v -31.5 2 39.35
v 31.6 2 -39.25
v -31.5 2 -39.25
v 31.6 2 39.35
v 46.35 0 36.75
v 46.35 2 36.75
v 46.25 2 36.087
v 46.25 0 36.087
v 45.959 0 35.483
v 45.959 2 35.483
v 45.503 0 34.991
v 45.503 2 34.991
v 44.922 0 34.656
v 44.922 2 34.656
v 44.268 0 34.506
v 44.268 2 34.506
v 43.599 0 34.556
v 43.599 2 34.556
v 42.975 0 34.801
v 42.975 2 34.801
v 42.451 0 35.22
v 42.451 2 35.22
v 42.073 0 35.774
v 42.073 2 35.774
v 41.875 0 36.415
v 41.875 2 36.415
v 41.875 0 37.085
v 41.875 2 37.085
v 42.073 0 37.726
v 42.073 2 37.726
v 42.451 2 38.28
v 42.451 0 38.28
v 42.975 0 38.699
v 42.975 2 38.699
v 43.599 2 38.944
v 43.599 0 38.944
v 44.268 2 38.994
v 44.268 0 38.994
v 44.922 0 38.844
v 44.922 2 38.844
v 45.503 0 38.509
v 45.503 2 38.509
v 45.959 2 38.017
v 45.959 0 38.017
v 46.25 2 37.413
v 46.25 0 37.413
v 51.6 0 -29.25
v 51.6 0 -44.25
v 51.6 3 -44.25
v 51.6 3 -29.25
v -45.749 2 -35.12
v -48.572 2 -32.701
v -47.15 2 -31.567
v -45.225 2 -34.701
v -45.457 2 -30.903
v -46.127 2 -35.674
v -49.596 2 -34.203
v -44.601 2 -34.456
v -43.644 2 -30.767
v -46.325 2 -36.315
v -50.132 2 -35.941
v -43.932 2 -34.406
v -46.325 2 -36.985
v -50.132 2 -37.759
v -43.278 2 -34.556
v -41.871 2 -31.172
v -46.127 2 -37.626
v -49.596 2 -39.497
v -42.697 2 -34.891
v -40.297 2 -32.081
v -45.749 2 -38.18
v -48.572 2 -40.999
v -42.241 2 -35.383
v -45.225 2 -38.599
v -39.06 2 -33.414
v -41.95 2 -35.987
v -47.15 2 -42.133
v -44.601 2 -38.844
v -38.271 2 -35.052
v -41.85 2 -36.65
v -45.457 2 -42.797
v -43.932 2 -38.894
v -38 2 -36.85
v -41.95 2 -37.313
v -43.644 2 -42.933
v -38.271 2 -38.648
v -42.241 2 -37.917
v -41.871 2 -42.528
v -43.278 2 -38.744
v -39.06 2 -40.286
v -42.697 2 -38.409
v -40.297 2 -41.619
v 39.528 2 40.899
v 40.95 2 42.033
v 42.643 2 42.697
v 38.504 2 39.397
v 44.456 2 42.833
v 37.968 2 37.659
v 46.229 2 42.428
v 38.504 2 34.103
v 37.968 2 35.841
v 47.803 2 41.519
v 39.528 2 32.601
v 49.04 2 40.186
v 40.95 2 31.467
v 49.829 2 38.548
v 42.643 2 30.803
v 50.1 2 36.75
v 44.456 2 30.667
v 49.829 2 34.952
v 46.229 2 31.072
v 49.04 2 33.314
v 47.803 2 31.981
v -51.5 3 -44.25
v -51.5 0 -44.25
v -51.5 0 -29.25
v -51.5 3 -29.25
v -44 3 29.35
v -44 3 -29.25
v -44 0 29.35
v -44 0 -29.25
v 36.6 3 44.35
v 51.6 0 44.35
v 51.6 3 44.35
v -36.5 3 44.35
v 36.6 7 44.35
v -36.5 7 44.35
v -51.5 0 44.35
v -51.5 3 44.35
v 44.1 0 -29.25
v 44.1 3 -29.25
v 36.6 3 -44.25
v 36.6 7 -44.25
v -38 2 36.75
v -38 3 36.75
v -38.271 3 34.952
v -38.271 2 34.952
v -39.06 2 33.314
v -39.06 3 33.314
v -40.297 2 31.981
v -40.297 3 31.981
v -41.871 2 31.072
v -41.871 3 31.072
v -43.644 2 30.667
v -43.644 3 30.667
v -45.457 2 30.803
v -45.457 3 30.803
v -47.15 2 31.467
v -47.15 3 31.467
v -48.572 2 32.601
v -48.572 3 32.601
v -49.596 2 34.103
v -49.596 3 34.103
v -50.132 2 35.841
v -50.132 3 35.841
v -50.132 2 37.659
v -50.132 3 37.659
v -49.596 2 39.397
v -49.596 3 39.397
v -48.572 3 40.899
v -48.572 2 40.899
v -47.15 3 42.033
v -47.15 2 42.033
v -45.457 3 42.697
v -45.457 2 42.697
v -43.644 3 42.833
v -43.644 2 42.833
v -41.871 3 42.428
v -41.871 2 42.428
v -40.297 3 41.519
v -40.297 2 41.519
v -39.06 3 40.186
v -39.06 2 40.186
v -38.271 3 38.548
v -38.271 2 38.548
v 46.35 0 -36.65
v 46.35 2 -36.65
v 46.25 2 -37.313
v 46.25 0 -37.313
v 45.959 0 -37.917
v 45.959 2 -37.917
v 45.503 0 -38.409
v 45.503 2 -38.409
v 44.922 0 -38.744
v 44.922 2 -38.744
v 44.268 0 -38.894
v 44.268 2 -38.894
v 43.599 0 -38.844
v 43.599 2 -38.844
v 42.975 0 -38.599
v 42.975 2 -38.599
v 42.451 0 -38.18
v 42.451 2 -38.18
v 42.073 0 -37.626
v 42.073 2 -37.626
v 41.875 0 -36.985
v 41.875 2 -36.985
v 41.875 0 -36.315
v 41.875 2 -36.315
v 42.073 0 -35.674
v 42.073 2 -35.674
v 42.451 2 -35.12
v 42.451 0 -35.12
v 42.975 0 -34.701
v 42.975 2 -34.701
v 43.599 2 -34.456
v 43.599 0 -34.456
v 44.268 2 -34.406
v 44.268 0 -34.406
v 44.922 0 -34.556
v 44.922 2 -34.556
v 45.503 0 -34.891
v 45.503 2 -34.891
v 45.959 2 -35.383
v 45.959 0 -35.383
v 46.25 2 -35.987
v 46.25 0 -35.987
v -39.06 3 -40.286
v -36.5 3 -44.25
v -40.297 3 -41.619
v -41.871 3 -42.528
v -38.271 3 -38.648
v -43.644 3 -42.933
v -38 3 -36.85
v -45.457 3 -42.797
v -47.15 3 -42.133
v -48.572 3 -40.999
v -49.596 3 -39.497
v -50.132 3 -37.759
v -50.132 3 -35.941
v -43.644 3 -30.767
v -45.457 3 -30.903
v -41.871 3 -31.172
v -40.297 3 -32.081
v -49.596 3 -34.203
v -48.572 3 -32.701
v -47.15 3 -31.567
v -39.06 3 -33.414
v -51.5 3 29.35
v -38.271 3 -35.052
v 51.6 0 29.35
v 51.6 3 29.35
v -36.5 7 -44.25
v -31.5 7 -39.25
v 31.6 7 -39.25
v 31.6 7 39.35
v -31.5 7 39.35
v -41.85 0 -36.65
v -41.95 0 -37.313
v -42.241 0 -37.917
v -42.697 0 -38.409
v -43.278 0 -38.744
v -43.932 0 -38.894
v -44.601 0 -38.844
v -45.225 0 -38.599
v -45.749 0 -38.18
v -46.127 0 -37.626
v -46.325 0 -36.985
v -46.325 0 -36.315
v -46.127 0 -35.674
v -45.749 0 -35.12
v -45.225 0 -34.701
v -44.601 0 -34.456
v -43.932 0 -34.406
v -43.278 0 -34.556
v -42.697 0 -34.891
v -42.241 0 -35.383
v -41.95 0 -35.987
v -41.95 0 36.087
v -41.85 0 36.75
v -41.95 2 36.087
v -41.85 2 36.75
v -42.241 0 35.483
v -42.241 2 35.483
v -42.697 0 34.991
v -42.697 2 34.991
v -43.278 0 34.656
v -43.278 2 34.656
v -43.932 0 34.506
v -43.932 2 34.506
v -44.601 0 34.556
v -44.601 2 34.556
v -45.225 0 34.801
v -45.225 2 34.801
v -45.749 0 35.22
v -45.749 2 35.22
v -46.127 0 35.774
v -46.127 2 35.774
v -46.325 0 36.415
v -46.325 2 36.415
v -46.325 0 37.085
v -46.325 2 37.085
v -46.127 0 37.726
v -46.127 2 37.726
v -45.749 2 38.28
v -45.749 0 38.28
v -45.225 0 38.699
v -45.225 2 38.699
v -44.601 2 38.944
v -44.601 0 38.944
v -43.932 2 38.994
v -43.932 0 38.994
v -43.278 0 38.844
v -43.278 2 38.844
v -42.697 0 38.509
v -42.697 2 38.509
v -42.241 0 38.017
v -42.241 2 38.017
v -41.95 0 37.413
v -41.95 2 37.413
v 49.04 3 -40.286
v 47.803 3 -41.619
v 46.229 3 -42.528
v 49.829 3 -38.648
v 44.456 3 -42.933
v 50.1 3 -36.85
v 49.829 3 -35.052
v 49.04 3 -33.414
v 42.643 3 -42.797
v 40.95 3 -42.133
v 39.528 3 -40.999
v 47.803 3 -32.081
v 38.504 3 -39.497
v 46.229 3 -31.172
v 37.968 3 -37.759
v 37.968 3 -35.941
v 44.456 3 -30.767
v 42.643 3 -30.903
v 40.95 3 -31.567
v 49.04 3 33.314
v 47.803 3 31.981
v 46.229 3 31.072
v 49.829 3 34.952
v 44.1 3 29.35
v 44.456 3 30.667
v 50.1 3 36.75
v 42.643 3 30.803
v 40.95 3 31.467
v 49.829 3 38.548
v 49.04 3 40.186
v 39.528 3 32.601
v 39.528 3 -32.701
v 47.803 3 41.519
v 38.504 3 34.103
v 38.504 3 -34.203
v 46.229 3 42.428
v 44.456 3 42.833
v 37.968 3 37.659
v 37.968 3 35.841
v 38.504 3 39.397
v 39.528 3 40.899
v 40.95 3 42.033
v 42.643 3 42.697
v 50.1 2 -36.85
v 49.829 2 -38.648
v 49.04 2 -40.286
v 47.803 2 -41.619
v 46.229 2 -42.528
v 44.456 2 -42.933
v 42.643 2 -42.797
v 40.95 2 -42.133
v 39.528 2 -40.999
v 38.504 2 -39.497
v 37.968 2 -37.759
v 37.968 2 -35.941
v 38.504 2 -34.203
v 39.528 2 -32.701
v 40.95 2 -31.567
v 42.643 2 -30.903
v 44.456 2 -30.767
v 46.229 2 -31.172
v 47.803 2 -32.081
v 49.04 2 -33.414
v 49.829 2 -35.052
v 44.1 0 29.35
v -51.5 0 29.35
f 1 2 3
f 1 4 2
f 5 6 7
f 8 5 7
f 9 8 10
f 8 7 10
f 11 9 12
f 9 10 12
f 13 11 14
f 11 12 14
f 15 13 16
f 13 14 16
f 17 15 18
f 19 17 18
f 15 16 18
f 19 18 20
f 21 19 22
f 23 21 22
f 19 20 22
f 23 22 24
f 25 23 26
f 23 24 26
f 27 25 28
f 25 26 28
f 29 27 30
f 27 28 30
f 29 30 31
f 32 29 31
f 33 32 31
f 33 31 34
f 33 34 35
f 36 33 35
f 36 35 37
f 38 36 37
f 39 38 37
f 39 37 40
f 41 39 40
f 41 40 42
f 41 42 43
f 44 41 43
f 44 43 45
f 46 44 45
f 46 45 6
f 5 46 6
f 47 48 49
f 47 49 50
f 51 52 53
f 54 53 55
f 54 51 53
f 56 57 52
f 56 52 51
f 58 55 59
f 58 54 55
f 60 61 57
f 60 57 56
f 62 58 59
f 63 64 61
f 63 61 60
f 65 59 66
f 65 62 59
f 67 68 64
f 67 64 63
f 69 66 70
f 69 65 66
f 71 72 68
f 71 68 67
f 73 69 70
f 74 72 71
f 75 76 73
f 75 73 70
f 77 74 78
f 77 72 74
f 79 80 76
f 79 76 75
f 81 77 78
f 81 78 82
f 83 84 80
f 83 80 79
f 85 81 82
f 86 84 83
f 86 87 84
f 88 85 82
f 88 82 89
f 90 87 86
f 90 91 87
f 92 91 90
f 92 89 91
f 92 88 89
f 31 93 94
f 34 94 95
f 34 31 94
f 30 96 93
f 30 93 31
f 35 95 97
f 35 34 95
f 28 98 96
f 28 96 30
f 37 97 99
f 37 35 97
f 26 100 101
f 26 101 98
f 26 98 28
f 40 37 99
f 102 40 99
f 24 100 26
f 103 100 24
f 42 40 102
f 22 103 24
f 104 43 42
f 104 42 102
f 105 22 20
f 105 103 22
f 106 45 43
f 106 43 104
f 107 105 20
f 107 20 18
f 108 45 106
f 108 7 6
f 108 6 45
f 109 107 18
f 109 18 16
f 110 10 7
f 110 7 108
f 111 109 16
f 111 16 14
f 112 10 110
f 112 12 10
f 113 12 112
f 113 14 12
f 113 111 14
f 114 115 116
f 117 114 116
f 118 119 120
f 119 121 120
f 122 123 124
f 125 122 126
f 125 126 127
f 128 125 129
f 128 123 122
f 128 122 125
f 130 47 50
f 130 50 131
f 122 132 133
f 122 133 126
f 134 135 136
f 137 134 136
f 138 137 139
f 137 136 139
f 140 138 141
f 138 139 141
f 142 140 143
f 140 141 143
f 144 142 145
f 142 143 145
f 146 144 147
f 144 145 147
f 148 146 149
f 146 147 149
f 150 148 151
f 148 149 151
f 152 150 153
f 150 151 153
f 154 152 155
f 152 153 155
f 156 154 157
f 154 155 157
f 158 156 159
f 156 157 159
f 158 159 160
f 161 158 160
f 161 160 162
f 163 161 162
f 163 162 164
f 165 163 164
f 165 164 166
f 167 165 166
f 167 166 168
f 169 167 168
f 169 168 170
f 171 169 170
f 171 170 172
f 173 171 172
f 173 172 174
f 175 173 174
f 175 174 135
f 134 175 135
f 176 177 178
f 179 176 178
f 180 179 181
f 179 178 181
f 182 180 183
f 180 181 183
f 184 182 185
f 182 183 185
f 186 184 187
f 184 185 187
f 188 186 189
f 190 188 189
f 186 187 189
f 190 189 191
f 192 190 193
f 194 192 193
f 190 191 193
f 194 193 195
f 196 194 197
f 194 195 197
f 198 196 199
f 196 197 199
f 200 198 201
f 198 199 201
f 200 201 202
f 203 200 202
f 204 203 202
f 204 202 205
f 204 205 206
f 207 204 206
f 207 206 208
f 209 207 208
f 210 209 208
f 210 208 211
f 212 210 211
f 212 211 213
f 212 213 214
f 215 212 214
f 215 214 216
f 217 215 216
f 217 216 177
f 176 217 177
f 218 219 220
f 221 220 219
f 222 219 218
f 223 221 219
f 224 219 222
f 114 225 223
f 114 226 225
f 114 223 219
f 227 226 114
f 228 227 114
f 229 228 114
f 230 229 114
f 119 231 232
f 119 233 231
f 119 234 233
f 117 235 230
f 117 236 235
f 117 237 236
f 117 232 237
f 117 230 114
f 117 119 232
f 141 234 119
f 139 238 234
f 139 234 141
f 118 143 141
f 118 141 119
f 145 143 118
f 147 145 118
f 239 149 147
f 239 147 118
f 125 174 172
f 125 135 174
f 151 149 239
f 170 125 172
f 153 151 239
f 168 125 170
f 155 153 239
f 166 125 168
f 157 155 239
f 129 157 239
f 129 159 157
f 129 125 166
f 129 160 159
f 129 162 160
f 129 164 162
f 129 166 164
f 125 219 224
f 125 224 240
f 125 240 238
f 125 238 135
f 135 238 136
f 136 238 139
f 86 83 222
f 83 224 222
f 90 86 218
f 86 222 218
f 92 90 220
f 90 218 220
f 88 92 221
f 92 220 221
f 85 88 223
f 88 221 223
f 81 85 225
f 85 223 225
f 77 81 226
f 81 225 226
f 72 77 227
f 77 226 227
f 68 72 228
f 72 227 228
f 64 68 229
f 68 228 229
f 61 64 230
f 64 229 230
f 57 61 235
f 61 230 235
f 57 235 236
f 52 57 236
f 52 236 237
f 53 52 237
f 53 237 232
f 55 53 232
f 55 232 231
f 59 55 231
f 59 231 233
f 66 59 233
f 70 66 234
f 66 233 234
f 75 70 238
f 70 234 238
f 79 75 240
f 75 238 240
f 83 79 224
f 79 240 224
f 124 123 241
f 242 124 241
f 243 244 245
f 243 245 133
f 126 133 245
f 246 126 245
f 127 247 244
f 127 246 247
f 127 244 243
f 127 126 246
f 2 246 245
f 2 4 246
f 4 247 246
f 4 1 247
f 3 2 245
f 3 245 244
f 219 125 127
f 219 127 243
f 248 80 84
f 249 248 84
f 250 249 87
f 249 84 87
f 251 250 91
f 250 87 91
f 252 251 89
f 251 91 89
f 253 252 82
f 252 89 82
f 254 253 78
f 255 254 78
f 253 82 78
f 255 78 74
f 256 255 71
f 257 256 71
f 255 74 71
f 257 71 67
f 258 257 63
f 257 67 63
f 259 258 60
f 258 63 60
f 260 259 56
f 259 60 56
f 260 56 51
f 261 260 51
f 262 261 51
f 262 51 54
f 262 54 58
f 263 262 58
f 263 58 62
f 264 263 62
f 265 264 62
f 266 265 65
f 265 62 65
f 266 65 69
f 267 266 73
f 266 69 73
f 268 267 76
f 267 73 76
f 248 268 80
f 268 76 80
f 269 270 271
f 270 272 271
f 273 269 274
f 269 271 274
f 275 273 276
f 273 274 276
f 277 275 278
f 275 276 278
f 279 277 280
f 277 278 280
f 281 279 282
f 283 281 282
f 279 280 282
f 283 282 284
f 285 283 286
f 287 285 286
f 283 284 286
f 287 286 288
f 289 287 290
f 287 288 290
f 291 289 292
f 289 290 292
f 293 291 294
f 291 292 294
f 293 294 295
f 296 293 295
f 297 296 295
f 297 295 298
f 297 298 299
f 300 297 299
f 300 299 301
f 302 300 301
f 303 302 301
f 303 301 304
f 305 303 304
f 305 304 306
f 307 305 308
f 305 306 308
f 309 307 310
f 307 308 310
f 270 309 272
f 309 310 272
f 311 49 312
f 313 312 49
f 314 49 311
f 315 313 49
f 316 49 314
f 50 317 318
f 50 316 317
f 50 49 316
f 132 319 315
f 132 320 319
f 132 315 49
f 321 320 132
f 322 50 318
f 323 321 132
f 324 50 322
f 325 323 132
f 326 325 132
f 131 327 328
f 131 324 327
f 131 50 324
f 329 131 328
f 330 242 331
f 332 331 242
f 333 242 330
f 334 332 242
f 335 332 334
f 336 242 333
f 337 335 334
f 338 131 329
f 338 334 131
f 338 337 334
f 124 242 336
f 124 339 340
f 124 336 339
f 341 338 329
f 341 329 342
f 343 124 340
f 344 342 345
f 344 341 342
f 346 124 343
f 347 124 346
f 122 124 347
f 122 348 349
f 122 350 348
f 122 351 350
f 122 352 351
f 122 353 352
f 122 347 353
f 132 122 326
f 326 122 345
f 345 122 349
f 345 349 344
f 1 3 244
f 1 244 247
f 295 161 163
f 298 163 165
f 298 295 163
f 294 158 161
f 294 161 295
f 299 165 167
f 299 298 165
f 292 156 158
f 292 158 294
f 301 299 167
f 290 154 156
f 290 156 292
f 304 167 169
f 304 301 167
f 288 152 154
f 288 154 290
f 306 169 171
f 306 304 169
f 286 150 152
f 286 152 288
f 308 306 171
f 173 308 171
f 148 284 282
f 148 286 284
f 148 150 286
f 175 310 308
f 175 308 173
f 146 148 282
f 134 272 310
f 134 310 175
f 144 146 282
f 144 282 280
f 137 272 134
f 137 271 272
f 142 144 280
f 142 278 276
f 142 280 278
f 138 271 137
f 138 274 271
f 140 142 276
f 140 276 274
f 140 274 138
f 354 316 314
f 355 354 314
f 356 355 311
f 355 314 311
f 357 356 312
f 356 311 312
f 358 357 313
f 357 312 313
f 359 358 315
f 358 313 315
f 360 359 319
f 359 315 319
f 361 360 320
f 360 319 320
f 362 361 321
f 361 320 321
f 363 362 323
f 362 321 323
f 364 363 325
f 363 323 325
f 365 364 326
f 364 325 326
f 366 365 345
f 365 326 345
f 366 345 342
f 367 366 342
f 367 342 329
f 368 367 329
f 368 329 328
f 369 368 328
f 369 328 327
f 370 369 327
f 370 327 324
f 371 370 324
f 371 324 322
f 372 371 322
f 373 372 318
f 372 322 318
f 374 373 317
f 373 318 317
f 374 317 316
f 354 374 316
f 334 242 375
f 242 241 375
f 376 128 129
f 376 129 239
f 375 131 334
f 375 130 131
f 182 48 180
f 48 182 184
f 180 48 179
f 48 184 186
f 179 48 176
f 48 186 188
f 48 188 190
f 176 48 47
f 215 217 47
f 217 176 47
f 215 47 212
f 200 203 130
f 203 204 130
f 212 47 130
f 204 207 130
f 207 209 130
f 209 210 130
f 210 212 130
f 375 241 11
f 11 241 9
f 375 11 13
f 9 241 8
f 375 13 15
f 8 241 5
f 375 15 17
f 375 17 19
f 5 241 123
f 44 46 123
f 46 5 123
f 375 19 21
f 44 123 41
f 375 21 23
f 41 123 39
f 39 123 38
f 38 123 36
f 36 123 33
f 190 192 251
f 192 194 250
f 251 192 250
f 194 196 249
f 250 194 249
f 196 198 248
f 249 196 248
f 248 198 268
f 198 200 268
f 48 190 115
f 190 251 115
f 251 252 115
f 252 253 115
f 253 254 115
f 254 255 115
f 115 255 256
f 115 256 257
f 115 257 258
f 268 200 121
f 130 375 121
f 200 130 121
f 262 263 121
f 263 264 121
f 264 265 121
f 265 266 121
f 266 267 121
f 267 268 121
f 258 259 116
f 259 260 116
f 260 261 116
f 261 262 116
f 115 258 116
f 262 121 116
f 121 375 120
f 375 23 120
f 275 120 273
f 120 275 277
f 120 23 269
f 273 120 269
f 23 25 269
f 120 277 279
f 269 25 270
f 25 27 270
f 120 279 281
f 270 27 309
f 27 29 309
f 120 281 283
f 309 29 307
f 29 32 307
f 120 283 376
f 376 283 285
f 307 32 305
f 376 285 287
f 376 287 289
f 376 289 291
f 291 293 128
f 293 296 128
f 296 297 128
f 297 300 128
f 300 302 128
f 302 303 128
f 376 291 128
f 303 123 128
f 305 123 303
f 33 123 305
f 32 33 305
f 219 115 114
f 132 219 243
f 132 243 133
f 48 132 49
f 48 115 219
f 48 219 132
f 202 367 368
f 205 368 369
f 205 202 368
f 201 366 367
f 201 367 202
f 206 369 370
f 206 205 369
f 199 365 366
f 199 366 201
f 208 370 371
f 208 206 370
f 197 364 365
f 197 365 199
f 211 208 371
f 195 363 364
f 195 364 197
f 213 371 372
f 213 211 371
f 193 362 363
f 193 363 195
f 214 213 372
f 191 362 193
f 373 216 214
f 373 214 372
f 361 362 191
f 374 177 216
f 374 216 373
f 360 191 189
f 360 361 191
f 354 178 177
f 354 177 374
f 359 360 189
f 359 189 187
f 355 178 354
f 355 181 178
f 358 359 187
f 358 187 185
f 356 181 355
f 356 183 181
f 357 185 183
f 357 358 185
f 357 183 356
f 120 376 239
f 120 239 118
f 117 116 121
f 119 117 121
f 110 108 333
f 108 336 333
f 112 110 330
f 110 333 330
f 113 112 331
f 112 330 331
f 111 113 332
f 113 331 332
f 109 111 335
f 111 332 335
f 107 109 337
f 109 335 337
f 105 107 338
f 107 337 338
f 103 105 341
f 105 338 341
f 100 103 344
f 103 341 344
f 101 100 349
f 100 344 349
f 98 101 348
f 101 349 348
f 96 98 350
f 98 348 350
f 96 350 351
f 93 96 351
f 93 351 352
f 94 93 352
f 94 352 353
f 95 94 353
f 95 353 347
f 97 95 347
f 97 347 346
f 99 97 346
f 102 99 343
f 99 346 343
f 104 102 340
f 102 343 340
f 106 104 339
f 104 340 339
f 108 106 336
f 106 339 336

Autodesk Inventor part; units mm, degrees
ref_plane "YZ Plane" through (0, 0, 0) normal (1, 0, 0) x (0, 1, 0)
ref_plane "XZ Plane" through (0, 0, 0) normal (0, 1, 0) x (-1, 0, 0)
ref_plane "XY Plane" through (0, 0, 0) normal (0, 0, 1) x (1, 0, 0)
sketch "Boceto1" plane through (0, 0, 0) normal (0, 1, 0) x (-1, 0, 0)
  line L0 (-31.6, 39.35) -> (-31.6, -39.25)
  line L1 (-31.6, -39.25) -> (31.5, -39.25)
  line L2 (31.5, -39.25) -> (31.5, 39.35)
  line L3 (31.5, 39.35) -> (-31.6, 39.35)
  line L4 (-31.6, 39.35) -> (31.5, -39.25) construction
  line L5 (-31.6, -39.25) -> (31.5, 39.35) construction
  line L6 (36.5, 44.35) -> (36.5, -44.25)
  line L7 (36.5, -44.25) -> (-36.6, -44.25)
  line L8 (-36.6, -44.25) -> (-36.6, 44.35)
  line L9 (-36.6, 44.35) -> (36.5, 44.35)
  point P0 (0, 0)
  point P1 (-0.05, 0.05)
  dimension "d0" = 78.6
  dimension "d1" = 63.1
  dimension "d2" = 5
extrude "Extrusión1" add sketch "Boceto1" along normal blind 2 contours L3 L2 L1 L0
sketch "Boceto2" plane through (0, 0, 0) normal (0, 1, 0) x (-1, 0, 0)
  line L0 (-31.6, 39.35) -> (-31.6, -39.25)
  line L1 (-31.6, -39.25) -> (31.5, -39.25)
  line L2 (31.5, -39.25) -> (31.5, 39.35)
  line L3 (31.5, 39.35) -> (-31.6, 39.35)
  line L4 (-31.6, 39.35) -> (31.5, -39.25) construction
  line L5 (-31.6, -39.25) -> (31.5, 39.35) construction
  line L6 (36.5, 44.35) -> (36.5, -44.25)
  line L7 (36.5, -44.25) -> (-36.6, -44.25)
  line L8 (-36.6, -44.25) -> (-36.6, 44.35)
  line L9 (-36.6, 44.35) -> (36.5, 44.35)
  point P0 (0, 0)
  point P1 (0, 0)
  point P2 (-0.05, 0.05)
  dimension "d5" = 78.6
  dimension "d6" = 63.1
  dimension "d7" = 5
extrude "Extrusión2" add sketch "Boceto2" along normal blind 7
sketch "Boceto3" plane through (0, 0, 0) normal (0, 1, 0) x (-1, 0, 0)
  circle A0 centre (44, 36.85) radius 6.1
  line L0 (36.5, 44.35) -> (-36.6, 44.35) projected
  line L1 (36.5, 44.35) -> (51.5, 44.35)
  line L2 (51.5, 44.35) -> (51.5, 29.35)
  line L3 (51.5, 29.35) -> (36.5, 29.35)
  line L4 (36.5, 29.35) -> (36.5, 44.35)
  line L5 (36.5, -44.25) -> (36.5, 44.35) projected
  line L6 (36.5, 0.05) -> (47.8738, 0.05)
  line L7 (-0.05, 44.35) -> (-0.05, 26.6285)
  circle A1 centre (44, -36.75) radius 6.1
  line L8 (36.5, -44.25) -> (51.5, -44.25)
  line L9 (51.5, -44.25) -> (51.5, -29.25)
  line L10 (51.5, -29.25) -> (36.5, -29.25)
  line L11 (36.5, -29.25) -> (36.5, -44.25)
  circle A2 centre (-44.1, 36.85) radius 6.1
  line L12 (-36.6, 44.35) -> (-51.6, 44.35)
  line L13 (-51.6, 44.35) -> (-51.6, 29.35)
  line L14 (-51.6, 29.35) -> (-36.6, 29.35)
  line L15 (-36.6, 29.35) -> (-36.6, 44.35)
  circle A3 centre (-44.1, -36.75) radius 6.1
  line L16 (-36.6, -44.25) -> (-51.6, -44.25)
  line L17 (-51.6, -44.25) -> (-51.6, -29.25)
  line L18 (-51.6, -29.25) -> (-36.6, -29.25)
  line L19 (-36.6, -29.25) -> (-36.6, -44.25)
  line L20 (44, 29.35) -> (36.5, 29.35)
  line L21 (36.5, 29.35) -> (36.5, -29.25)
  line L22 (36.5, -29.25) -> (44, -29.25)
  line L23 (44, -29.25) -> (44, 29.35)
  line L24 (-36.6, 0.05) -> (-47.9738, 0.05)
  line L25 (-36.6, 29.35) -> (-36.6, -29.25)
  line L26 (-44.1, -29.25) -> (-44.1, 29.35)
  point P0 (0, 0)
  dimension "d10" = 12.2
  dimension "d11" = 15
  dimension "d12" = 15
extrude "Extrusión3" add sketch "Boceto3" along normal blind 3 contours A0 | L15 L14 L13 L12 | L1 L2 L3 L4 | L3 L23 L6 L5 | L6 L23 L10 L5 | L25 L24 L26 L14 | L10 L9 L8 L5 | L25 L18 L26 L24 | L19 L16 L17 L18 | A1 | A2 | A3
sketch "Boceto4" plane through (0, 3, 0) normal (0, 1, 0) x (1, 0, 0)
  circle A0 centre (44, 36.85) radius 6.1
  line L0 (36.5, 44.35) -> (-36.6, 44.35)
  line L1 (36.5, 44.35) -> (51.5, 44.35)
  line L2 (51.5, 44.35) -> (51.5, 29.35)
  line L3 (51.5, 29.35) -> (36.5, 29.35)
  line L4 (36.5, 29.35) -> (36.5, 44.35)
  line L5 (36.5, -44.25) -> (36.5, 44.35)
  line L6 (36.5, 0.05) -> (47.8738, 0.05)
  line L7 (-0.05, 44.35) -> (-0.05, 26.6285)
  circle A1 centre (44, -36.75) radius 6.1
  line L8 (36.5, -44.25) -> (51.5, -44.25)
  line L9 (51.5, -44.25) -> (51.5, -29.25)
  line L10 (51.5, -29.25) -> (36.5, -29.25)
  line L11 (36.5, -29.25) -> (36.5, -44.25)
  line L12 (-51.6, 29.35) -> (-36.6, 29.35)
  circle A2 centre (-44.1, 36.85) radius 6.1
  line L13 (-36.6, 44.35) -> (-51.6, 44.35)
  line L14 (-36.6, 29.35) -> (-36.6, 44.35)
  line L15 (-51.6, 44.35) -> (-51.6, 29.35)
  line L16 (-51.6, -29.25) -> (-36.6, -29.25)
  circle A3 centre (-44.1, -36.75) radius 6.1
  line L17 (-36.6, -29.25) -> (-36.6, -44.25)
  line L18 (-51.6, -44.25) -> (-51.6, -29.25)
  line L19 (-36.6, -44.25) -> (-51.6, -44.25)
  point P0 (0, 0)
  point P1 (0, 0)
  dimension "d15" = 12.2
  dimension "d16" = 15
  dimension "d17" = 15
extrude "Extrusión4" cut sketch "Boceto4" against normal blind 1 contours A0 | A1 | A2 | A3
sketch "Boceto5" plane through (-44.1, 2, 36.75) normal (0, 1, 0) x (1, 0, 0)
  circle A0 centre (0, 0) radius 2.25
  line L0 (7.6, 66) -> (7.6, 7.4) projected
  line L1 (7.6, 36.7) -> (1.3256, 36.7)
  line L2 (44.1, -8.1109) -> (44.1, -20.0015)
  circle A1 centre (0, 73.4) radius 2.25
  circle A2 centre (88.2, 0) radius 2.25
  circle A3 centre (88.2, 73.4) radius 2.25
  point P0 (44.1, 36.75)
  dimension "d20" = 4.5
extrude "Extrusión5" cut sketch "Boceto5" against normal blind 2
properties part number "battery_pack_base"
